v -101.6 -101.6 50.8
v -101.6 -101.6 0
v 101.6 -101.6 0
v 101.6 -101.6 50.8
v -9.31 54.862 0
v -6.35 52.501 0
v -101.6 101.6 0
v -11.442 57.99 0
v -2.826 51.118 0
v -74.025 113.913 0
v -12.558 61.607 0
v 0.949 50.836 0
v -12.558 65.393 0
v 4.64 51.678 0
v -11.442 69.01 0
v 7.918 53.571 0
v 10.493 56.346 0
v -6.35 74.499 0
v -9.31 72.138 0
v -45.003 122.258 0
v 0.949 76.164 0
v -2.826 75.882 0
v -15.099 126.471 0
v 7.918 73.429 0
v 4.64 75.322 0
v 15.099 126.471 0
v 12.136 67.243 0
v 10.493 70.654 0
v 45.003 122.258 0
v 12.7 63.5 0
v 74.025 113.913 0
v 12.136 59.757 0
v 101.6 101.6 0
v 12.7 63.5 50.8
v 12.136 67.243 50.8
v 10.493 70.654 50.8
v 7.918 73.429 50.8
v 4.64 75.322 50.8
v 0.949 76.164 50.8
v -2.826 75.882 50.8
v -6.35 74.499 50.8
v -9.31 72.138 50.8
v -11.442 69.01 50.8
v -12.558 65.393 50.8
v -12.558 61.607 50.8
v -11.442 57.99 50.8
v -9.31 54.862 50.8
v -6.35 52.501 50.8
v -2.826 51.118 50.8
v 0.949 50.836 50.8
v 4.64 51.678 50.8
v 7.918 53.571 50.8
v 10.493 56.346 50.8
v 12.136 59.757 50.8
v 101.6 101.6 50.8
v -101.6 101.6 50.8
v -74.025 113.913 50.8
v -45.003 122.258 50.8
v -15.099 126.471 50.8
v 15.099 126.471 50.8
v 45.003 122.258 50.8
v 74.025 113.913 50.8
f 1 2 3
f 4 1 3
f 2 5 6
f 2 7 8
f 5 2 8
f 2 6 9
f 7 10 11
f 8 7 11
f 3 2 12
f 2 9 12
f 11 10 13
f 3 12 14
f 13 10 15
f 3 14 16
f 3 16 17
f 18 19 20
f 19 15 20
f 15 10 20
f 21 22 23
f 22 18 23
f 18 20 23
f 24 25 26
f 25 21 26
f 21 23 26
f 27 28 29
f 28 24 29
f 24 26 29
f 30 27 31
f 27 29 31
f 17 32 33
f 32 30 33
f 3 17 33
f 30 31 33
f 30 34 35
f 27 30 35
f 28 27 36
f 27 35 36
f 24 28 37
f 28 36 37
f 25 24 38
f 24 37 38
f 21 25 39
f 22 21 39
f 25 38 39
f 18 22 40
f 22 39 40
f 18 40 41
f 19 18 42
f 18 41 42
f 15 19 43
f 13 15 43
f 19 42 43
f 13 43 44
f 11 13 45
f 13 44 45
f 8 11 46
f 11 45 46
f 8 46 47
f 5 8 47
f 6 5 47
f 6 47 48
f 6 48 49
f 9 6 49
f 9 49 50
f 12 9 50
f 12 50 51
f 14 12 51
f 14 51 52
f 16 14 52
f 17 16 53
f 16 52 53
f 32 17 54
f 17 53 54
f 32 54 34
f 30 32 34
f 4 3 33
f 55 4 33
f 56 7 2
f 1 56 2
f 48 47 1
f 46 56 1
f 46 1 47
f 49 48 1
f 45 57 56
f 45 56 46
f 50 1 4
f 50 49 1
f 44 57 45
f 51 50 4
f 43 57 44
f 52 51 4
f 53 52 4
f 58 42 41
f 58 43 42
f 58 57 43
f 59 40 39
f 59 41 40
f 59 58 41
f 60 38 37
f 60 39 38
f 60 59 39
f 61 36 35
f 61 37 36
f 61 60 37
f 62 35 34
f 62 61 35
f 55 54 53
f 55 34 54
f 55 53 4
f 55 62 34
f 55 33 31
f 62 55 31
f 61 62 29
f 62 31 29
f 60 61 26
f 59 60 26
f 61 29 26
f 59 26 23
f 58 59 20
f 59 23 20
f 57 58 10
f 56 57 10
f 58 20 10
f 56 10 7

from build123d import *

# Parameters (mm, degrees)
F1_DEPTH = 50.8
F2_R     = 12.7
F3_DEPTH = 50.8


with BuildPart() as f1:
    # F0 (on Top) → F1 (new body)
    with BuildSketch(Plane.XY):
        with BuildLine():
            Line((-101.6, 101.6), (-101.6, 0))
            Line((-101.6, 0), (-101.6, -101.6))
            Line((-101.6, -101.6), (101.6, -101.6))
            Line((101.6, -101.6), (101.6, 0))
            Line((101.6, 0), (101.6, 101.6))
            ThreePointArc((101.6, 101.6), (0, 127), (-101.6, 101.6))
        make_face()
    extrude(amount=F1_DEPTH)

    # F2 (on face) → F3 (cut)
    with BuildSketch(Plane.XY.offset(50.8)):
        with Locations((0, 63.5)):
            Circle(F2_R)
    extrude(amount=-F3_DEPTH, mode=Mode.SUBTRACT)


solid = f1.part
